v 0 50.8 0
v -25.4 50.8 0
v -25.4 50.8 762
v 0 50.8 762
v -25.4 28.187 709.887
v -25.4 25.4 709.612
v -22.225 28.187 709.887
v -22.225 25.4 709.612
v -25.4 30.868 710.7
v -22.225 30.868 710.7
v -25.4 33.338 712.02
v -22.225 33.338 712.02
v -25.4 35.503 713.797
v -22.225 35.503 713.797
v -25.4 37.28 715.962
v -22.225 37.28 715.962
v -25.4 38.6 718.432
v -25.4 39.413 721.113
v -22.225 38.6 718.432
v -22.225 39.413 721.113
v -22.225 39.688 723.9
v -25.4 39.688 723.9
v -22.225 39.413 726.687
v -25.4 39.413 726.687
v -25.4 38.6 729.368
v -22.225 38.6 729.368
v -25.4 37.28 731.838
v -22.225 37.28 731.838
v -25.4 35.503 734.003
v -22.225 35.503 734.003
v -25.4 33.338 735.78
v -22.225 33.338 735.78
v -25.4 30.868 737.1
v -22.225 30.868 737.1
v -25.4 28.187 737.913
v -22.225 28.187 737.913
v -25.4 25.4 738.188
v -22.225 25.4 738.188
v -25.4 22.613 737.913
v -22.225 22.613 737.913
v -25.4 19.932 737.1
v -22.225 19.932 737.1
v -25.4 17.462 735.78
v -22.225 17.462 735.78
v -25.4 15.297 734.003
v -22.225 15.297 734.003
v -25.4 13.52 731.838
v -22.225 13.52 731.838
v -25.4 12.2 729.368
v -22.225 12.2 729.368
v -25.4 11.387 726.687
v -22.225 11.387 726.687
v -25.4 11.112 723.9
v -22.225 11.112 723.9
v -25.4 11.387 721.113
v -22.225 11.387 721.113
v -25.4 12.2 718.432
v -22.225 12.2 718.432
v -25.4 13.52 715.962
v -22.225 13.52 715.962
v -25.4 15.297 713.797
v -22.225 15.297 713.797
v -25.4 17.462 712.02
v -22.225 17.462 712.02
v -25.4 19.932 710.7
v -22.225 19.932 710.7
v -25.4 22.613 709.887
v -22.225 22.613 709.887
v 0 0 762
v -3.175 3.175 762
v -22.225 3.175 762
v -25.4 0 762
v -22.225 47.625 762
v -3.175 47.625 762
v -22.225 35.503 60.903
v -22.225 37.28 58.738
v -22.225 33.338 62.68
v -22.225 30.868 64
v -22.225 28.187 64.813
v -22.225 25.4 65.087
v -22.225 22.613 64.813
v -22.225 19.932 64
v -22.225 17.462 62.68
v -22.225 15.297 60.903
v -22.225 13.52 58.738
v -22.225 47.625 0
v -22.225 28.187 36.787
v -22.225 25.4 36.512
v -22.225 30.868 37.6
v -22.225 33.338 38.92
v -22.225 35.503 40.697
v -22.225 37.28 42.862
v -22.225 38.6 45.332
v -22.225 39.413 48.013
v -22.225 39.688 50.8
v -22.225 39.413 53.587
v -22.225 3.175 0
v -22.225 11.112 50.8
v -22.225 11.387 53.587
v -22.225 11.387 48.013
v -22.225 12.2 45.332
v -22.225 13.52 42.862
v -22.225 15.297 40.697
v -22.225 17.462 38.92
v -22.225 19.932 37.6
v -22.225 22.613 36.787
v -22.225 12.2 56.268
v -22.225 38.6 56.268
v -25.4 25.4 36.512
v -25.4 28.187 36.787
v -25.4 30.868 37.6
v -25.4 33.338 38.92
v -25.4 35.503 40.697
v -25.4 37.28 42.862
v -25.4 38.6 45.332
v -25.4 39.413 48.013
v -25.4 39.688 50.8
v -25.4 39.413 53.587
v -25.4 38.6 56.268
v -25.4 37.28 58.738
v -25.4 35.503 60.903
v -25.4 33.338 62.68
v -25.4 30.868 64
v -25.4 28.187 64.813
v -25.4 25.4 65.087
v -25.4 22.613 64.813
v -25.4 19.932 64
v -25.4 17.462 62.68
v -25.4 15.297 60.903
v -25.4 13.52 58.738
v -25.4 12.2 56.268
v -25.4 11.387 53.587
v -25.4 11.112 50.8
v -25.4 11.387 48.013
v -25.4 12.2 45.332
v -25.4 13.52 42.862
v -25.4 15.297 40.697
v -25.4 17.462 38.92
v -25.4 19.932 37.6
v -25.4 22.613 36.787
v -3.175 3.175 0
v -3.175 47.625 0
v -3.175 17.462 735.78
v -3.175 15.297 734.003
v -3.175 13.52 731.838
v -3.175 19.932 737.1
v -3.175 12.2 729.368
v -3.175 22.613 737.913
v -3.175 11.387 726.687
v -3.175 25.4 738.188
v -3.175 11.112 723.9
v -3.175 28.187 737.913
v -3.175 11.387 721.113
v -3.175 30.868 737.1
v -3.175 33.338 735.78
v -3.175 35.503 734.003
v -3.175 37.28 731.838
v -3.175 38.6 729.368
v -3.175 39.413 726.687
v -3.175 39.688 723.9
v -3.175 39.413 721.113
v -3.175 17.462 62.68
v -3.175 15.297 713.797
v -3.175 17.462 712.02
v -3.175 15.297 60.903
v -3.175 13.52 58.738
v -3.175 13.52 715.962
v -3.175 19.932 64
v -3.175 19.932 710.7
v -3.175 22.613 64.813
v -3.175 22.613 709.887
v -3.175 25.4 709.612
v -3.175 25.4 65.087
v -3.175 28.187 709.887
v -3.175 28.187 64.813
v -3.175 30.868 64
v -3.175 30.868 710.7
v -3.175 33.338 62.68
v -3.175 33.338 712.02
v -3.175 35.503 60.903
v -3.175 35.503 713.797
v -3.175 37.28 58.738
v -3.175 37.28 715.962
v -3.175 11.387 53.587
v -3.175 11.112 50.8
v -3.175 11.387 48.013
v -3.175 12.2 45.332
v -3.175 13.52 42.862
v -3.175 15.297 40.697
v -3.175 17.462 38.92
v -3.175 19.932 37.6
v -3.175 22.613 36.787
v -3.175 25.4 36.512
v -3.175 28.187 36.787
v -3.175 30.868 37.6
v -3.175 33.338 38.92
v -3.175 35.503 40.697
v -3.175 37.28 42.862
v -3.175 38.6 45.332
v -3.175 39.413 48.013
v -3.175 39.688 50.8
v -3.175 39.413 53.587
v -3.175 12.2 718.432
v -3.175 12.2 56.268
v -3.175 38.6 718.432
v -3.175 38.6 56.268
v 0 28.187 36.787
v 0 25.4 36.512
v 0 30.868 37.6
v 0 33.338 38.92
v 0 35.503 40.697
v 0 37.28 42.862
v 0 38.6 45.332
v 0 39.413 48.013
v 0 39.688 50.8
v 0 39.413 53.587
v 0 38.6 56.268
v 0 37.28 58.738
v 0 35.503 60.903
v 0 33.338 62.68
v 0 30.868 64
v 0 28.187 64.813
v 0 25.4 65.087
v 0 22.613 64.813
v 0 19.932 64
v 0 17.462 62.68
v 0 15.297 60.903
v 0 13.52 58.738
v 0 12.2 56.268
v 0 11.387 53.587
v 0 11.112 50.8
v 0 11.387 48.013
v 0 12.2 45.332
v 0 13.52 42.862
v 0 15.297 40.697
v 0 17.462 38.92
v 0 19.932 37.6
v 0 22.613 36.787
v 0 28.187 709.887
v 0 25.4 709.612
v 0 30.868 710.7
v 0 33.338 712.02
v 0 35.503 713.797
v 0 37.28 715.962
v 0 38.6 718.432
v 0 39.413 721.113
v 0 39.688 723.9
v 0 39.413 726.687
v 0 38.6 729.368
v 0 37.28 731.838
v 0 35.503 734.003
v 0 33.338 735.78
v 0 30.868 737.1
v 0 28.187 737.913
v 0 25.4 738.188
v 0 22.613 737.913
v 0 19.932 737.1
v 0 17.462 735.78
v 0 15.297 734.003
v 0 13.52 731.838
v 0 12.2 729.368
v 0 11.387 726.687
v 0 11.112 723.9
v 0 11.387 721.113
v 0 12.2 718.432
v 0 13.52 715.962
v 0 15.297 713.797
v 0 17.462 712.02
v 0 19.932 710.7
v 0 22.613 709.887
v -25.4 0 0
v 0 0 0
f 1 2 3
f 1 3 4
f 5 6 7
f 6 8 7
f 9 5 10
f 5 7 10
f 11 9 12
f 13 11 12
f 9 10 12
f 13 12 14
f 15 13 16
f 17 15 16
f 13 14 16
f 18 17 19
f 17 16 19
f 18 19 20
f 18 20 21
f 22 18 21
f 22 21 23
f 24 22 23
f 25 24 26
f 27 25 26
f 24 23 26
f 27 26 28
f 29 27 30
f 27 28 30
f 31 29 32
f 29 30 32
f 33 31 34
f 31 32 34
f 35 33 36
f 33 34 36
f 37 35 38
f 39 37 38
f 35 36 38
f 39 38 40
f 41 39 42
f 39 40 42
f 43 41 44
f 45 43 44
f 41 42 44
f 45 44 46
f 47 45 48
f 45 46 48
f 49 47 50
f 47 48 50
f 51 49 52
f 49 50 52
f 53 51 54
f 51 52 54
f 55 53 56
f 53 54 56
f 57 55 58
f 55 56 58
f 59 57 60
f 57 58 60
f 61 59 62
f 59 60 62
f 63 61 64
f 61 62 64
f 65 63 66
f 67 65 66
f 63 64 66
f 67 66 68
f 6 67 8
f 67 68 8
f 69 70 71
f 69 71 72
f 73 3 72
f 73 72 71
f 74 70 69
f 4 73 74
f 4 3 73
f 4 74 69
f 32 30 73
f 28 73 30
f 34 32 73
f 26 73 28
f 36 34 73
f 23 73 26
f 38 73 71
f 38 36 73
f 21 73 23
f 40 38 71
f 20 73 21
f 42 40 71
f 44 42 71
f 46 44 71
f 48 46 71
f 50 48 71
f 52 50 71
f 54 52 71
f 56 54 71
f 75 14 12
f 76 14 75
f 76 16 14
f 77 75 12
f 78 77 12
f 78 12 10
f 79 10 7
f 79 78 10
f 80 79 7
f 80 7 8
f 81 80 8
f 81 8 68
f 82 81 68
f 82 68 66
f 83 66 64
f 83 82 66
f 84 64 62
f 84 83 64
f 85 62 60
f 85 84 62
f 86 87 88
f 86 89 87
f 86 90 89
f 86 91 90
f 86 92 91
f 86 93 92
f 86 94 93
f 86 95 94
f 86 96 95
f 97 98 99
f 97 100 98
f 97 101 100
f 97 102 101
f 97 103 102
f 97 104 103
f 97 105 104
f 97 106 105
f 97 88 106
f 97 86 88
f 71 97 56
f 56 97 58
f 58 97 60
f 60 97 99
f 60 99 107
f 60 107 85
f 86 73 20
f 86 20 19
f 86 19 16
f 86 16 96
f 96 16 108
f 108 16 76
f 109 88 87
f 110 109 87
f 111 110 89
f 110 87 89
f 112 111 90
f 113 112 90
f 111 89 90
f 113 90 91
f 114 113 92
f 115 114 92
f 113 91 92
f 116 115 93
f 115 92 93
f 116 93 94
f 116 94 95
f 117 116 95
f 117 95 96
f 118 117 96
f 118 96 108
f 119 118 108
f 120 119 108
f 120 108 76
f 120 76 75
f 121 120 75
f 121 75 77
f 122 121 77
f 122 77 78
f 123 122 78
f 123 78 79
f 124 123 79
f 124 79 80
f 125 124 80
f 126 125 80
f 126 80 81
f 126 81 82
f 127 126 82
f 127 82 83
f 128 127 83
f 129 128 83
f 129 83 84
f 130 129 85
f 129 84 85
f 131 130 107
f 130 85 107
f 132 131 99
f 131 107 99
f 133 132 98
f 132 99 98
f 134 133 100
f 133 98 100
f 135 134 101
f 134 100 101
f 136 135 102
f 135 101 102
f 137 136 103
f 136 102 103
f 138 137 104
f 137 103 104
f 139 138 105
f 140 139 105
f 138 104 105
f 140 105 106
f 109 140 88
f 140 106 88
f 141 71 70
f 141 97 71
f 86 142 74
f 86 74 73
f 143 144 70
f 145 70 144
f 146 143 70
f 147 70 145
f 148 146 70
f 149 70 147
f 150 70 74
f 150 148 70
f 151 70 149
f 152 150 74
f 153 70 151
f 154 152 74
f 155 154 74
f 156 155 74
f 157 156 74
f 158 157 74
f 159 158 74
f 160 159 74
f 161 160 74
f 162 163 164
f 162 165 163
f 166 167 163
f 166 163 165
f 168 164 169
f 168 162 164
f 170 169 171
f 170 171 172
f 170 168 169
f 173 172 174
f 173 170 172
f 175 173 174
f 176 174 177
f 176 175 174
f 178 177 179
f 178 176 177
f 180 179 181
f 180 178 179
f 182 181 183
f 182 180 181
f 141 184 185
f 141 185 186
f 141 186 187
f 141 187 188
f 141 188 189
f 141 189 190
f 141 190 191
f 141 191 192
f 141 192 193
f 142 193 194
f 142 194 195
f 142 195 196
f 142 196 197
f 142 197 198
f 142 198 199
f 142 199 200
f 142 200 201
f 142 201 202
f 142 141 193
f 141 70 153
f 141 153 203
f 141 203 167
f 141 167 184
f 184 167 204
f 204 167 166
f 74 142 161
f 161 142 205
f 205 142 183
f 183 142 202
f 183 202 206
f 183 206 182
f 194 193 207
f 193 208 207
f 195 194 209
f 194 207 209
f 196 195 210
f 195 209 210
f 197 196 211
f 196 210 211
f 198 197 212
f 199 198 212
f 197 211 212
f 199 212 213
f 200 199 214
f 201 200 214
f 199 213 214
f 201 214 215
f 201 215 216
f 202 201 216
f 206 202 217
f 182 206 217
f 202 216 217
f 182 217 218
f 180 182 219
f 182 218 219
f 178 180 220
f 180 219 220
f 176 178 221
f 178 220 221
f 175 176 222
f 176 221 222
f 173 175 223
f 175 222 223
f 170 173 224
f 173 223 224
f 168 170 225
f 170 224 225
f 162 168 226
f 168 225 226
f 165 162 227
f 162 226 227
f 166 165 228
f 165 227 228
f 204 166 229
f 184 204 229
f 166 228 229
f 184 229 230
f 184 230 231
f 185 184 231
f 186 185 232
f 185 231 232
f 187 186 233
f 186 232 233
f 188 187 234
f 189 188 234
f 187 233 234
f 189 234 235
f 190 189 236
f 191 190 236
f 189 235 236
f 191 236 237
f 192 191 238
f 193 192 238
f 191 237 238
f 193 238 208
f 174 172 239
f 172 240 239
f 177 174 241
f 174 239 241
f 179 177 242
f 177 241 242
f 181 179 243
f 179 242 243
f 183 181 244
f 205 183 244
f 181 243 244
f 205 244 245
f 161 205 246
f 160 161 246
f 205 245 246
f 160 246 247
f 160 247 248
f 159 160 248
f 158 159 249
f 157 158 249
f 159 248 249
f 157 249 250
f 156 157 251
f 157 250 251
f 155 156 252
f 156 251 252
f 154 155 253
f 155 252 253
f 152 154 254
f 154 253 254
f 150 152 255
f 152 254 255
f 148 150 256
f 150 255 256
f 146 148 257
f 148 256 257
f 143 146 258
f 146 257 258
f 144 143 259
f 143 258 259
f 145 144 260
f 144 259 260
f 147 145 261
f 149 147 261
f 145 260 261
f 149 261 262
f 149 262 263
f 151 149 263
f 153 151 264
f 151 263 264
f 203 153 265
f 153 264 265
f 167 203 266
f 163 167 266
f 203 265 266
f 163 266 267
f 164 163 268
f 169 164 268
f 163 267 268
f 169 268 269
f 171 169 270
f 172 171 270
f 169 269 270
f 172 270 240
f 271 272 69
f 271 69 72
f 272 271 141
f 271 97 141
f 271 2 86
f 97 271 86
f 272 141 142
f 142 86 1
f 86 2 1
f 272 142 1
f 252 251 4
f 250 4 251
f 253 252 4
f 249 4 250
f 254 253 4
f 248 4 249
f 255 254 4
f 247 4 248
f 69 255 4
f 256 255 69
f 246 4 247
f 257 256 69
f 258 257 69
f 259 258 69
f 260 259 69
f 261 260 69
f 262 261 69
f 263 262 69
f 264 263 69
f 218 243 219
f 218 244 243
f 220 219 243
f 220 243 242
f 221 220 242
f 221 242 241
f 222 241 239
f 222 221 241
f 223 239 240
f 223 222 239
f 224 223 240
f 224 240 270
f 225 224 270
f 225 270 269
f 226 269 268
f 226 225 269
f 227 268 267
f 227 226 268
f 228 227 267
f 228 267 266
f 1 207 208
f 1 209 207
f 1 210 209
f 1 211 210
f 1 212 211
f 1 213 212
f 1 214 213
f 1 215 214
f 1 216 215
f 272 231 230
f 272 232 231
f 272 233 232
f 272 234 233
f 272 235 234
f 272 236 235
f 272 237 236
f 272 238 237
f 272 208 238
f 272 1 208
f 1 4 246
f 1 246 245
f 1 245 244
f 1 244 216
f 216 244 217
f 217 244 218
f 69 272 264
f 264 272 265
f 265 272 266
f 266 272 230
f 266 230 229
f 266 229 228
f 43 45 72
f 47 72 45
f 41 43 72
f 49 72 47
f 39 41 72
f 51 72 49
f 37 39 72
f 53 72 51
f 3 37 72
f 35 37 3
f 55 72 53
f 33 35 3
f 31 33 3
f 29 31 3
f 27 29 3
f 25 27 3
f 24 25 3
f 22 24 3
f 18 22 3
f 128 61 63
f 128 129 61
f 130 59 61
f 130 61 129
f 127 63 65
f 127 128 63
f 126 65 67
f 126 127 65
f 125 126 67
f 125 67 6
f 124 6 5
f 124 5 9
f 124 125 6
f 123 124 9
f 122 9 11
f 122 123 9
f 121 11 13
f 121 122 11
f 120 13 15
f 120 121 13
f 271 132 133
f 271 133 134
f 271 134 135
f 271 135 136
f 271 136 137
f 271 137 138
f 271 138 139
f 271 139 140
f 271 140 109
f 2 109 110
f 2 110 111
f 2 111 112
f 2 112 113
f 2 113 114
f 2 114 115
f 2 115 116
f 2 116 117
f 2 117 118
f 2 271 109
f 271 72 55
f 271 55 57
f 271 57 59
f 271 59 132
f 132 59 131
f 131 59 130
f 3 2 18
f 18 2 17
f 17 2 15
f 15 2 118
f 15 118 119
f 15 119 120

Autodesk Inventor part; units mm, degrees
ref_plane "YZ Plane" through (0, 0, 0) normal (1, 0, 0) x (0, 1, 0)
ref_plane "XZ Plane" through (0, 0, 0) normal (0, 1, 0) x (-1, 0, 0)
ref_plane "XY Plane" through (0, 0, 0) normal (0, 0, 1) x (1, 0, 0)
sketch "Sketch1" plane through (0, 0, 0) normal (0, 0, 1) x (1, 0, 0)
  line L0 (0, 0) -> (-25.4, 0)
  line L1 (-25.4, 0) -> (-25.4, 50.8)
  line L2 (-25.4, 50.8) -> (0, 50.8)
  line L3 (0, 50.8) -> (0, 0)
  line L4 (-22.225, 3.175) -> (-3.175, 3.175)
  line L5 (-3.175, 3.175) -> (-3.175, 47.625)
  line L6 (-3.175, 47.625) -> (-22.225, 47.625)
  line L7 (-22.225, 47.625) -> (-22.225, 3.175)
  dimension "d0" = 25.4
  dimension "d1" = 50.8
  dimension "d2" = 3.175
extrude "Extrusion1" add sketch "Sketch1" along normal blind 762
sketch "Sketch2" plane through (0, 0, 0) normal (1, 0, 0) x (0, 0, -1)
  circle A0 centre (-50.8, 25.4) radius 14.2875
  line L0 (0, 50.8) -> (0, 0) projected
  line L1 (0, 0) -> (-762, 0) projected
  dimension "d5" = 50.8
  dimension "d6" = 25.4
  dimension "d7" = 28.575
extrude "Extrusion2" cut sketch "Sketch2" against normal blind 930.1395
sketch "Sketch3" plane through (0, 0, 0) normal (1, 0, 0) x (0, 0, -1)
  circle A0 centre (-723.9, 25.4) radius 14.2875
  line L0 (-762, 0) -> (-762, 50.8) projected
  line L1 (0, 50.8) -> (-762, 50.8) projected
  point P0 (0, 0)
  dimension "d10" = 38.1
  dimension "d11" = 25.4
  dimension "d12" = 28.575
extrude "Extrusion3" cut sketch "Sketch3" against normal blind 25.4
properties part number "DRL Angle"
